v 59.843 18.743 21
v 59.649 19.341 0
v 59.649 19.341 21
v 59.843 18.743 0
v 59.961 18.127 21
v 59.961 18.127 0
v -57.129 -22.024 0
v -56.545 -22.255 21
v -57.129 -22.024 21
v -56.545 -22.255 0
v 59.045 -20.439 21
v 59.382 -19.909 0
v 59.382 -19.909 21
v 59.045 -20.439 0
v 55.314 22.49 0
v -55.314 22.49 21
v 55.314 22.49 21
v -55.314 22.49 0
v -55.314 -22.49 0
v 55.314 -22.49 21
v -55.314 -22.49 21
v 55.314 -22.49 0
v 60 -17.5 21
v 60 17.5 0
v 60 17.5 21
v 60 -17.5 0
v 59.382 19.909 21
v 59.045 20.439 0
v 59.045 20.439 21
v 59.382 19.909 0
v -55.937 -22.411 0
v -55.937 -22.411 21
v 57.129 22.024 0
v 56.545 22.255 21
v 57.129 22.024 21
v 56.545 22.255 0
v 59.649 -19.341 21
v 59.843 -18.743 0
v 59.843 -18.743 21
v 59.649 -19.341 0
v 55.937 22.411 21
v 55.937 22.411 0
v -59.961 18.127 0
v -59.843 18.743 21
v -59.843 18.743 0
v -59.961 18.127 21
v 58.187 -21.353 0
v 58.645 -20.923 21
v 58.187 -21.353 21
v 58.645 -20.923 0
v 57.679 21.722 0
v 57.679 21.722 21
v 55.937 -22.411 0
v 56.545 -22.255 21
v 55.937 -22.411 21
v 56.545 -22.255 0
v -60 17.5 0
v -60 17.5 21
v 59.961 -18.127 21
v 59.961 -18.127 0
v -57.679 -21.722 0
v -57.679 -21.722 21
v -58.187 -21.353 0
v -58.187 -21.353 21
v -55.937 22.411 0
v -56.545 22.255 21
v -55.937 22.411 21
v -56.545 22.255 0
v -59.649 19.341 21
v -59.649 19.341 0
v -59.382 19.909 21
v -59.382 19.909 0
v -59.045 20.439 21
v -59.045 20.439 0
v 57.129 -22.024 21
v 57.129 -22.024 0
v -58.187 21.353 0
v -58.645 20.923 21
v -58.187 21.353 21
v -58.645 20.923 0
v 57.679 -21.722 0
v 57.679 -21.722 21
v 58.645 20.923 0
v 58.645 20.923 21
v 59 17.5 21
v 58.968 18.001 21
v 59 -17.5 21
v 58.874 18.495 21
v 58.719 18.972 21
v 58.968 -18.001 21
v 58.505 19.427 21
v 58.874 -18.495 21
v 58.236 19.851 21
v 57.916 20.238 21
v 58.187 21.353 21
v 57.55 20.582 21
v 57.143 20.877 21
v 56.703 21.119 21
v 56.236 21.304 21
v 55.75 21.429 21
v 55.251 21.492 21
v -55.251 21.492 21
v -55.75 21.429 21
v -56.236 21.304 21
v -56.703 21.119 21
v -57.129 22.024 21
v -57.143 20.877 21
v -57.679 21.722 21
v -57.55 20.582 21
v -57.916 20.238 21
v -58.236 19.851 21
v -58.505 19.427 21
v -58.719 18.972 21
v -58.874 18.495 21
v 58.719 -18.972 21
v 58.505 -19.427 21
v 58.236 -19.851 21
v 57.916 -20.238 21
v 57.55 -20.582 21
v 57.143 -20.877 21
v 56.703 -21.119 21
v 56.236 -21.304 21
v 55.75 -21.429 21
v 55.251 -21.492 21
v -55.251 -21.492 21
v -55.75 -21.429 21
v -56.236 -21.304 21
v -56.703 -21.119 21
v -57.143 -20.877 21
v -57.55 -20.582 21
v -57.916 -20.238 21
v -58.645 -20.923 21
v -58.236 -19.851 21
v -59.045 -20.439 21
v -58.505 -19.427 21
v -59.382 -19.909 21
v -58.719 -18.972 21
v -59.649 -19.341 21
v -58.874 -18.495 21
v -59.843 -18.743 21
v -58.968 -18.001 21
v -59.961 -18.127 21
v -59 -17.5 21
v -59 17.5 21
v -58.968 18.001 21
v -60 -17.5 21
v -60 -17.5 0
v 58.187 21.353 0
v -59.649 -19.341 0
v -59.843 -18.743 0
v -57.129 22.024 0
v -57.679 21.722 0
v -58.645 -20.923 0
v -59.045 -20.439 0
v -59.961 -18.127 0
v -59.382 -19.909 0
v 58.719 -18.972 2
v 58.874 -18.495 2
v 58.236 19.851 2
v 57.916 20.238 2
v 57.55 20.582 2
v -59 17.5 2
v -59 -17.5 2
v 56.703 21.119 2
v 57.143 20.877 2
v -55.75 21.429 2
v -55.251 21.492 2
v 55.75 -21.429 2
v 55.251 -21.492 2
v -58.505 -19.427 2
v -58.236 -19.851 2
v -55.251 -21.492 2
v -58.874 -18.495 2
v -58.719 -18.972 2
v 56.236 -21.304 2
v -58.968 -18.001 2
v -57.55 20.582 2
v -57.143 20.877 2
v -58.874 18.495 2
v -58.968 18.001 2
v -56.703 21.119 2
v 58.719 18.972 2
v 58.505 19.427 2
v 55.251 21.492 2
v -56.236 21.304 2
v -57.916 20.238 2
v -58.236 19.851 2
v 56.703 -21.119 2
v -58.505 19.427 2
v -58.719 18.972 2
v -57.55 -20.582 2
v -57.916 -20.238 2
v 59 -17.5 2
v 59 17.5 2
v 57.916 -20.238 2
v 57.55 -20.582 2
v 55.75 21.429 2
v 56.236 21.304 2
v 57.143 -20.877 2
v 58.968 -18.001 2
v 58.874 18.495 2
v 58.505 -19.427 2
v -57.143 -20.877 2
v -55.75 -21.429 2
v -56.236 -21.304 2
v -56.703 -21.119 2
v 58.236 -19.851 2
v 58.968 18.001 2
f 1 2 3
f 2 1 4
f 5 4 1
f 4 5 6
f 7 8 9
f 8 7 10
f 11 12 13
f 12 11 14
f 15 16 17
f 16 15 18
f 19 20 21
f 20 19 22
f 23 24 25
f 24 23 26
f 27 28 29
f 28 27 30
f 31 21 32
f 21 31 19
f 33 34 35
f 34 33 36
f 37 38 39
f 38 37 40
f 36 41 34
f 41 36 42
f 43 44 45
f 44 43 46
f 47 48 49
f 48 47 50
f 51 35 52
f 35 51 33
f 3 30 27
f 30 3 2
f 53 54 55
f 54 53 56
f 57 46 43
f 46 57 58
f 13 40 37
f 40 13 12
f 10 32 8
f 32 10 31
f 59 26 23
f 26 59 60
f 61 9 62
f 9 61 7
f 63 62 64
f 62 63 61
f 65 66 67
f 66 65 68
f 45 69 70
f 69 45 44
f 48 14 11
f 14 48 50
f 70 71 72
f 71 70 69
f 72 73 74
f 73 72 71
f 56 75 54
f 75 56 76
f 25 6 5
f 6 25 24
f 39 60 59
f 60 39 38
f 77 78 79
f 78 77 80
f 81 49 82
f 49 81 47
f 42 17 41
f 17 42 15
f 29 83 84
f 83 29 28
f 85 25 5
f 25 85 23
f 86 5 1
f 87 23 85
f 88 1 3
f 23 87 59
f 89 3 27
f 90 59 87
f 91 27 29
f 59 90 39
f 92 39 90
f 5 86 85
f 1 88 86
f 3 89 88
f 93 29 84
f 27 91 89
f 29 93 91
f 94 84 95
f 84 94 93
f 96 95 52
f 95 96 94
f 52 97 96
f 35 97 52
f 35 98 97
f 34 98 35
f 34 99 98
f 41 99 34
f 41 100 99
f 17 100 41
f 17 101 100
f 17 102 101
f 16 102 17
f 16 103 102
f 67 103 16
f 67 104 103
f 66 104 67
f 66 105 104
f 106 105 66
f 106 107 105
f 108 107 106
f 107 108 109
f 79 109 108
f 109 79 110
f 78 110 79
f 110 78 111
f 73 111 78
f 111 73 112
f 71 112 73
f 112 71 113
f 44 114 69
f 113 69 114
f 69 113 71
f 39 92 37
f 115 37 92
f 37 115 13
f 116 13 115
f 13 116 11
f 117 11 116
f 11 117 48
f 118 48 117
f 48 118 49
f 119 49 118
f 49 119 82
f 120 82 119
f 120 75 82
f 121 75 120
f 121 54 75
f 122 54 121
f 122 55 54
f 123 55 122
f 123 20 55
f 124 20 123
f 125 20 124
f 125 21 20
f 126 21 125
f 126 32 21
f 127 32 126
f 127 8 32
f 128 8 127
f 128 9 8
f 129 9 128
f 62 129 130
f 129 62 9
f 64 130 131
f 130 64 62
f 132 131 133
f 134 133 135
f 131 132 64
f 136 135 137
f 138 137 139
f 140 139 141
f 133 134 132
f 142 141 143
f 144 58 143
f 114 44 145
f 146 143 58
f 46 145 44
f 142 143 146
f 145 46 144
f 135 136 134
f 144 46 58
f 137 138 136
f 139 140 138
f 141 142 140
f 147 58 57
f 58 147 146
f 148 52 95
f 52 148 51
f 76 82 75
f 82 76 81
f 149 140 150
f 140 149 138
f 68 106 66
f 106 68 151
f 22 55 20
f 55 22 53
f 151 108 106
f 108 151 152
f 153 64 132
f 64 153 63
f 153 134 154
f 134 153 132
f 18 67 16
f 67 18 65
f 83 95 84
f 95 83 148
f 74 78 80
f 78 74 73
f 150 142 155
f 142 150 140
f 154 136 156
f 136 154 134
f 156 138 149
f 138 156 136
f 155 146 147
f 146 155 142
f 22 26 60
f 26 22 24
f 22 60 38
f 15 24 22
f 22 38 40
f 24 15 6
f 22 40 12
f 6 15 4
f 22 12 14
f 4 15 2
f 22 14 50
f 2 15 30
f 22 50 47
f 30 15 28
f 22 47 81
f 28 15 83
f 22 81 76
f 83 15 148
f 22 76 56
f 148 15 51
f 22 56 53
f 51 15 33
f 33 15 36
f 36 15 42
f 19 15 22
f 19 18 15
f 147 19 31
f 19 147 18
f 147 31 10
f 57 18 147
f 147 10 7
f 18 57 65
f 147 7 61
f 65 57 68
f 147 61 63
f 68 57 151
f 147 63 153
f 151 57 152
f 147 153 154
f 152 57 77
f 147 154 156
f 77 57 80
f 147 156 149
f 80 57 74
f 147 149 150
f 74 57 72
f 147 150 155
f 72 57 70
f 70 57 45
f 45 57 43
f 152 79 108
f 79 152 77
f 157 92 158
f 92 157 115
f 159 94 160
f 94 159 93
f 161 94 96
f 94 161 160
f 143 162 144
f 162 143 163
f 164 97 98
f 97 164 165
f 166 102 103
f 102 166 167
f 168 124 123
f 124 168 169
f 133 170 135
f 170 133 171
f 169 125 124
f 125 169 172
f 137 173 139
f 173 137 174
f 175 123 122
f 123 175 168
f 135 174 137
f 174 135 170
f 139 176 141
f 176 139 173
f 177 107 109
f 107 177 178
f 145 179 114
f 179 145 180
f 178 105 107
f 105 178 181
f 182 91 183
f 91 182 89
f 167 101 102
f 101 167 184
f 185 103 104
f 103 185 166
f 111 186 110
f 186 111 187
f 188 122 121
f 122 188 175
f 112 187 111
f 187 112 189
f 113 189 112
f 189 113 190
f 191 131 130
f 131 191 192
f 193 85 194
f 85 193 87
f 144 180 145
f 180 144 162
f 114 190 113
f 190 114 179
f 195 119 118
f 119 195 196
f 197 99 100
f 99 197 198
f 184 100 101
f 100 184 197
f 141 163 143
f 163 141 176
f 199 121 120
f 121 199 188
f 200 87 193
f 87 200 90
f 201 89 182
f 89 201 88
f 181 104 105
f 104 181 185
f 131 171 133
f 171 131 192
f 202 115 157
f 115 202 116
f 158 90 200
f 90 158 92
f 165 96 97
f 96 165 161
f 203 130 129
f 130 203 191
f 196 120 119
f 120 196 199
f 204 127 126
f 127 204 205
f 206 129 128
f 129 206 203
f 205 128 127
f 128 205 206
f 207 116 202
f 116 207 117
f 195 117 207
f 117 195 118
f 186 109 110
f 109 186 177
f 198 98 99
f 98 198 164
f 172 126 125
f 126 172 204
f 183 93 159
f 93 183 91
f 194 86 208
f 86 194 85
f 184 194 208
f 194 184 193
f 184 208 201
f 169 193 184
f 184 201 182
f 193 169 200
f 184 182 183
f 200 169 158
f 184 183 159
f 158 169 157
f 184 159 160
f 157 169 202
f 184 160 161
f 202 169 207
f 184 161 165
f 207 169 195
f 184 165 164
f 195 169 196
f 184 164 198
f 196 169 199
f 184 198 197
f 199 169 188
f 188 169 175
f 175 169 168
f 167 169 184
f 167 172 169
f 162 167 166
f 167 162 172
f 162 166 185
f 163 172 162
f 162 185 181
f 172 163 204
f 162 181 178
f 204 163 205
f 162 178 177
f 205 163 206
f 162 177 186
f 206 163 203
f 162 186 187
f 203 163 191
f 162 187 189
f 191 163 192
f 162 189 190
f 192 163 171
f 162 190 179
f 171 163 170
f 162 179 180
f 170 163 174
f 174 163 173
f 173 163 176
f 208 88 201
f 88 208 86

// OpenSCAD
$fn = 50;


difference() {
	union() {
		hull() {
			translate(v = [-55.0000000000, 17.5000000000, 0]) {
				cylinder(h = 21, r = 5);
			}
			translate(v = [55.0000000000, 17.5000000000, 0]) {
				cylinder(h = 21, r = 5);
			}
			translate(v = [-55.0000000000, -17.5000000000, 0]) {
				cylinder(h = 21, r = 5);
			}
			translate(v = [55.0000000000, -17.5000000000, 0]) {
				cylinder(h = 21, r = 5);
			}
		}
	}
	union() {
		translate(v = [0, 0, 2]) {
			hull() {
				translate(v = [-55.0000000000, 17.5000000000, 0]) {
					cylinder(h = 19, r = 4);
				}
				translate(v = [55.0000000000, 17.5000000000, 0]) {
					cylinder(h = 19, r = 4);
				}
				translate(v = [-55.0000000000, -17.5000000000, 0]) {
					cylinder(h = 19, r = 4);
				}
				translate(v = [55.0000000000, -17.5000000000, 0]) {
					cylinder(h = 19, r = 4);
				}
			}
		}
	}
}
